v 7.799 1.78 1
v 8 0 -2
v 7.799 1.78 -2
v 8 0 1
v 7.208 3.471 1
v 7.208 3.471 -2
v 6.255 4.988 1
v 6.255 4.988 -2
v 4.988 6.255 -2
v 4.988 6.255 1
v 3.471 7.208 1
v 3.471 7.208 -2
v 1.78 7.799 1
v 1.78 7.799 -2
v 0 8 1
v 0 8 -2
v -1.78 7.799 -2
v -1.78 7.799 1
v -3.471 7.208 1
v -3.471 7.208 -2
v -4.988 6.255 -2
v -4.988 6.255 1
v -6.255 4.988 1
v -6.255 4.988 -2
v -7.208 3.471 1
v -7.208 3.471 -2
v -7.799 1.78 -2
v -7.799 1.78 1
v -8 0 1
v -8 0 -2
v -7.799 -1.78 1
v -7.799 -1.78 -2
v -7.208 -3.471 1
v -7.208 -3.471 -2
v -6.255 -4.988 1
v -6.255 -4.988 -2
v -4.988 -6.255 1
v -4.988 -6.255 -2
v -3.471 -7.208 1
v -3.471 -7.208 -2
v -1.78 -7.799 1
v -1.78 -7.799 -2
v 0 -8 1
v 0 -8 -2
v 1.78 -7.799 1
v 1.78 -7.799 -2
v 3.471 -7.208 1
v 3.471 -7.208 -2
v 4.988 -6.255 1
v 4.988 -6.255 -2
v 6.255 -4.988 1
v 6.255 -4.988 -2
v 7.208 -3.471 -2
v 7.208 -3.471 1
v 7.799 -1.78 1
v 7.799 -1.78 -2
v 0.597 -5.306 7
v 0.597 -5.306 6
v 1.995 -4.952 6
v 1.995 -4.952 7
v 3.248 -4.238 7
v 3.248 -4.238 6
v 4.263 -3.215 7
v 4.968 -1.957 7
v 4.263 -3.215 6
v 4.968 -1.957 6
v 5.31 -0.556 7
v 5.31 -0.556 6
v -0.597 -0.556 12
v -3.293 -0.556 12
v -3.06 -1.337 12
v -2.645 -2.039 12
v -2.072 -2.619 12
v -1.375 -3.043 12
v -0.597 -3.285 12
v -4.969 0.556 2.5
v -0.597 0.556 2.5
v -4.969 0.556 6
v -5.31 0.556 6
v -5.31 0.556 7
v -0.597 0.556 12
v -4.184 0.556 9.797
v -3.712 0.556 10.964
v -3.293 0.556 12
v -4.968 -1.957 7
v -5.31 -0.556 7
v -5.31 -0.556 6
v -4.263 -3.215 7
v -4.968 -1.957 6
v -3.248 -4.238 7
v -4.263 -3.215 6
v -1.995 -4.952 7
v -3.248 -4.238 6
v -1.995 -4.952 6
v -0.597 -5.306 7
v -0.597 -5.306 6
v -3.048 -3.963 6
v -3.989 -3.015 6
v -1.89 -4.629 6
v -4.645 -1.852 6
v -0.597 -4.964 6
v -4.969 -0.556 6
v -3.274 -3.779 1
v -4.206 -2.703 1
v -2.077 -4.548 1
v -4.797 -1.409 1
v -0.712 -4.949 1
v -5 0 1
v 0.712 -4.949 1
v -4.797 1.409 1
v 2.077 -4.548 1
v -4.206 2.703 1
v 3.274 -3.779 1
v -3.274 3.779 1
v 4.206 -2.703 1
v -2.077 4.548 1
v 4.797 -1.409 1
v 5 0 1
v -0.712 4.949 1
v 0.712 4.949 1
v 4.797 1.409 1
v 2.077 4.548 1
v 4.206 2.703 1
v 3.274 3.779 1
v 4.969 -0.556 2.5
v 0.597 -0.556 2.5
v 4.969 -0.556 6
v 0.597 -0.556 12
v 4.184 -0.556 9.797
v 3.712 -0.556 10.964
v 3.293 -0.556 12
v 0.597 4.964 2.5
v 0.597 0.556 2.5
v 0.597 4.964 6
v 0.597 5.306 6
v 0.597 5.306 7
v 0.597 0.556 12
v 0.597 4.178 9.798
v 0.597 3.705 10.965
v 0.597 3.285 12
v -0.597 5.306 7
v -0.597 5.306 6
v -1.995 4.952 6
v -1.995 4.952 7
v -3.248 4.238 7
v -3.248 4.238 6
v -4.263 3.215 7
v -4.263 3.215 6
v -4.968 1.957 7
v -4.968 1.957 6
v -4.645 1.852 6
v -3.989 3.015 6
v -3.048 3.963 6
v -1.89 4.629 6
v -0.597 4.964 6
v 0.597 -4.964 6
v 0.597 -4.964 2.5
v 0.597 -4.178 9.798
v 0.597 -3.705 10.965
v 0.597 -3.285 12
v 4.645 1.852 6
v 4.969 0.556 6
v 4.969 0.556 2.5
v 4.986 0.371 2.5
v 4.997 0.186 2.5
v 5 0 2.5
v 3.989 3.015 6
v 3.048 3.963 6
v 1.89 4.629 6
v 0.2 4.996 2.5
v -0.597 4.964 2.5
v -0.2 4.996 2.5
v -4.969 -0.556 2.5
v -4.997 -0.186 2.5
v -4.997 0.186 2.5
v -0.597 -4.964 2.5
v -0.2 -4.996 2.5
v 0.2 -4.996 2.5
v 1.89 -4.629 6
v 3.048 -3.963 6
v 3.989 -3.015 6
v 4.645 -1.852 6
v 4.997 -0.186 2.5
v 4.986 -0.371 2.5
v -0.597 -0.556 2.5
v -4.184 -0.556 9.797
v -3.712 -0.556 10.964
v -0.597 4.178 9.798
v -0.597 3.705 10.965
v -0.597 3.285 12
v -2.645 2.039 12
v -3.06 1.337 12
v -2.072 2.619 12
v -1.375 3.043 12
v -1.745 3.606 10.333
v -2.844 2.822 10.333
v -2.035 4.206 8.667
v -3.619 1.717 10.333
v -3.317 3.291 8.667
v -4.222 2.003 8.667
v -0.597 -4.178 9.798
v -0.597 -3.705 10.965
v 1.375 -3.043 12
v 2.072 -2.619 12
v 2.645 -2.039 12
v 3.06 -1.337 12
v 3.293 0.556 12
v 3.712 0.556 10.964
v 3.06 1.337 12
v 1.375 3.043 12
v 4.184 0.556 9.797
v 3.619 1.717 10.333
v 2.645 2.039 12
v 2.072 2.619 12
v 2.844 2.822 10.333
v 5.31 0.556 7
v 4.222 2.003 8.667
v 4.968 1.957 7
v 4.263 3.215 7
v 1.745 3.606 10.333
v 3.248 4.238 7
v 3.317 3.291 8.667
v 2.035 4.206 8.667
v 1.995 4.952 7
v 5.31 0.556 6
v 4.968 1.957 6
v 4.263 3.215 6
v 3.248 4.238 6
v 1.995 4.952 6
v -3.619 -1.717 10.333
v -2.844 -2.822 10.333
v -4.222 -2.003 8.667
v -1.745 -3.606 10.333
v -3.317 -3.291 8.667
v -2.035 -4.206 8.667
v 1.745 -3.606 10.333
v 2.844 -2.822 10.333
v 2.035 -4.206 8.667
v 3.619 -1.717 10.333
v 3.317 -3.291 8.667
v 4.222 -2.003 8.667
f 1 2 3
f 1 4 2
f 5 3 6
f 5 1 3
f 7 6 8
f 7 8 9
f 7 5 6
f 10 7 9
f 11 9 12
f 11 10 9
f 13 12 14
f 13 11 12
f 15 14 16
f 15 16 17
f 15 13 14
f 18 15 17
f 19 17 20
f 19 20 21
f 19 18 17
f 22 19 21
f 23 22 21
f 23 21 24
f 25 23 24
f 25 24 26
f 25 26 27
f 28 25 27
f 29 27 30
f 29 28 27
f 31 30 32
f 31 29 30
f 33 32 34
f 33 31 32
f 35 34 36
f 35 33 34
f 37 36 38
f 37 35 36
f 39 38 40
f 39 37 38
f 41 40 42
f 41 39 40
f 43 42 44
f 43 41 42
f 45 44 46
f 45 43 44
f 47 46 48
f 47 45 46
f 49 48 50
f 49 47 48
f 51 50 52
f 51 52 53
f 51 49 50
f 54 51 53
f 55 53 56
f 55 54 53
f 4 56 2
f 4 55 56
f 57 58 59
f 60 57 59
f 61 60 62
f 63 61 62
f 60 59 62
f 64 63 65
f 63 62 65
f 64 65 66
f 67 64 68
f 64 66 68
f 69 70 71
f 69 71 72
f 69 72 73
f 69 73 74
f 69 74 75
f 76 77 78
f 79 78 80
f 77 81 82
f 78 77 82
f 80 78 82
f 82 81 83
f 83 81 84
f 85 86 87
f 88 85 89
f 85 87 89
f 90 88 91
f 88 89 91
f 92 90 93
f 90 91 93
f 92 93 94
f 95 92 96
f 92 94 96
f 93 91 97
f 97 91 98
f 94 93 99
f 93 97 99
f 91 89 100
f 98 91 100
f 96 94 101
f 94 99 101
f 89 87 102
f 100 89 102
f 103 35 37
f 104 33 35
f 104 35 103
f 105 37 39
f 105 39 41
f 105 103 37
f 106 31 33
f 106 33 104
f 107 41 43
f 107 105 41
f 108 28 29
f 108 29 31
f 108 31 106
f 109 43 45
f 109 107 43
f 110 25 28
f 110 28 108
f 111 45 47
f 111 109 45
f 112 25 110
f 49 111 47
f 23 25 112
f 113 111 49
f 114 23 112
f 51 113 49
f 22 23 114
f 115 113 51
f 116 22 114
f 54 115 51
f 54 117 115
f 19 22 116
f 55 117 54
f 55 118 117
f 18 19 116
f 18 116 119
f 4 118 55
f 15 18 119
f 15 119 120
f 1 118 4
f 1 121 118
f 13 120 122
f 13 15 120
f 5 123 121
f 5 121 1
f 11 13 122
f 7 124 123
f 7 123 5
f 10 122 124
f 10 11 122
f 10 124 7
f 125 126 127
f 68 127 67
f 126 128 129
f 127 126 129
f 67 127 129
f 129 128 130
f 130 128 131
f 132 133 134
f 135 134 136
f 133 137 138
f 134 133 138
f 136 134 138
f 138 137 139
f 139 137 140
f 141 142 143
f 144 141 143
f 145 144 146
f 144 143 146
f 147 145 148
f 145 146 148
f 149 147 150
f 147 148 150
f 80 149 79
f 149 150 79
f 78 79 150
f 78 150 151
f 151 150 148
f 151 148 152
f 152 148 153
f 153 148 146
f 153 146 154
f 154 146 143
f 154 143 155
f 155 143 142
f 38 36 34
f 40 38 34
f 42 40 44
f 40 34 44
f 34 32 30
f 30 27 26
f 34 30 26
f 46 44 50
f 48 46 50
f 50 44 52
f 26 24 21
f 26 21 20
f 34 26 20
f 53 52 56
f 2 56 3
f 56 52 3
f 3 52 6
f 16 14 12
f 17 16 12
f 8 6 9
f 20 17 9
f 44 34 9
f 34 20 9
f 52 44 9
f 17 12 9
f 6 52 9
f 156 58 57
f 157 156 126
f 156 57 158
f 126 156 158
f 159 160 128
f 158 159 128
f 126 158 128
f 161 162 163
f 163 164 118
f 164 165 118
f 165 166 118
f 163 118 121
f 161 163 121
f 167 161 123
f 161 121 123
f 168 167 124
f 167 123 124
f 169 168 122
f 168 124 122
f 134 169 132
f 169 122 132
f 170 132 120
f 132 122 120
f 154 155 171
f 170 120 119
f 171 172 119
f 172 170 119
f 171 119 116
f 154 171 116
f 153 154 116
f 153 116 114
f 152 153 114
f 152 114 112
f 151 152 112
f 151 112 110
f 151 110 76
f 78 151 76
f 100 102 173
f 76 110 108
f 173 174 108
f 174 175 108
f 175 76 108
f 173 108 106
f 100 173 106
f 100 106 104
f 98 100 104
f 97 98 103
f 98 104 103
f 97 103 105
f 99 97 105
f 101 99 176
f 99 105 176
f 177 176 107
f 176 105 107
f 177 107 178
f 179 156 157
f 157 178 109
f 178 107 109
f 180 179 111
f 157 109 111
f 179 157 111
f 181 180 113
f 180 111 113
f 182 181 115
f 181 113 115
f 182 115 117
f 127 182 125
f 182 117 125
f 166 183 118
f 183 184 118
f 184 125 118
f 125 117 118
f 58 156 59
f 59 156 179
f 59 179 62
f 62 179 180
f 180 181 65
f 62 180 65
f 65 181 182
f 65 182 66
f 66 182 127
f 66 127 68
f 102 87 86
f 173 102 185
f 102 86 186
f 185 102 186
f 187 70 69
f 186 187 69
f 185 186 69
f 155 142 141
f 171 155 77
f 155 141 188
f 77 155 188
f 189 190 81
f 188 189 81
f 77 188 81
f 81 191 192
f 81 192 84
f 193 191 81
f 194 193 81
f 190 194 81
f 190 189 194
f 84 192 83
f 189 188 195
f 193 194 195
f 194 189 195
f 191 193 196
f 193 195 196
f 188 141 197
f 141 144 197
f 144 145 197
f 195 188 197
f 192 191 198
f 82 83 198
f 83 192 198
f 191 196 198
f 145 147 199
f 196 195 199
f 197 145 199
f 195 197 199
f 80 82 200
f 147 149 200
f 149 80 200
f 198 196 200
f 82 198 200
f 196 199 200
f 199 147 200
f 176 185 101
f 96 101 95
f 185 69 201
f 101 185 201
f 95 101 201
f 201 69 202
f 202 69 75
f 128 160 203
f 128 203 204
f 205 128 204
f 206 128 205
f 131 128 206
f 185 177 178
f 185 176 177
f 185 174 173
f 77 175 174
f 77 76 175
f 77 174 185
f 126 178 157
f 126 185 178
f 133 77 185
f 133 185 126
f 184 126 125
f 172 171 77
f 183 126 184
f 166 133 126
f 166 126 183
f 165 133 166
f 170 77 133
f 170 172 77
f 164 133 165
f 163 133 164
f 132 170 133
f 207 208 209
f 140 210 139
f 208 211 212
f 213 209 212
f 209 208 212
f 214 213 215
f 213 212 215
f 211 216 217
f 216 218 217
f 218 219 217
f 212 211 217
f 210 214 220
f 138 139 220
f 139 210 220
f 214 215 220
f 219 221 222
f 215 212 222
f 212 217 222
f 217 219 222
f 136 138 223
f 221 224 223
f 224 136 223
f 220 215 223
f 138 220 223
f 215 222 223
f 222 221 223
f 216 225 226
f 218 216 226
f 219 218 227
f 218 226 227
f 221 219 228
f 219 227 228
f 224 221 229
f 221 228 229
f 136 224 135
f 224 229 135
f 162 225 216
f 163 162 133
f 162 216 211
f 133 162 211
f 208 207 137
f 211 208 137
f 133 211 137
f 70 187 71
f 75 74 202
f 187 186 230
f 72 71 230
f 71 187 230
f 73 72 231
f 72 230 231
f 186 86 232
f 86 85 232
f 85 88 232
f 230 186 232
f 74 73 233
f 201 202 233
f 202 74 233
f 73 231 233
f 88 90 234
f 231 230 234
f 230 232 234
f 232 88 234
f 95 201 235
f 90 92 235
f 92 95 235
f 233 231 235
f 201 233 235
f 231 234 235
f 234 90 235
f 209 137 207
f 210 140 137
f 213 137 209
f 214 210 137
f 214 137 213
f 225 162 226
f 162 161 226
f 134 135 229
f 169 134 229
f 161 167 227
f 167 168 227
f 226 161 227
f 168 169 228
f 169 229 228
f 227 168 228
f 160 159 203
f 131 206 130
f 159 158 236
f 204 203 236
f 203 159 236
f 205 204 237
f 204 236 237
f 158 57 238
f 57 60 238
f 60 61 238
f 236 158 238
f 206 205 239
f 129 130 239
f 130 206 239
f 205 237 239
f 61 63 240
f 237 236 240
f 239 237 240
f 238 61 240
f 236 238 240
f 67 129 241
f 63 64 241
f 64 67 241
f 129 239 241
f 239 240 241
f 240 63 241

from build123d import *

# Parameters (mm, degrees)
F0_R      = 5
F1_DEPTH  = 12
F0_R_2    = 5.3391988331
F2_DEPTH  = 12
F3_DEPTH  = 6
F4_DEPTH  = 1
F0_R_3    = 8
F0_R_4    = 6
F5_DEPTH  = 1
F8_DEPTH  = 10
F9_SIZE2  = 5
F9_SIZE   = 2
F10_DEPTH = 2


with BuildPart() as f1:
    # F0 (on Top) → F1 (new body)
    with BuildSketch(Plane.XY):
        Circle(F0_R)
    extrude(amount=F1_DEPTH)

    # F0 (on Top) → F2 (join)
    with BuildSketch(Plane.XY):
        Circle(F0_R_2)
        Circle(F0_R, mode=Mode.SUBTRACT)
    extrude(amount=F2_DEPTH)

    # F0 (on Top) → F3 (cut)
    with BuildSketch(Plane.XY):
        Circle(F0_R_2)
        Circle(F0_R, mode=Mode.SUBTRACT)
    extrude(amount=F3_DEPTH, mode=Mode.SUBTRACT)

    # F0 (on Top) → F4 (join)
    with BuildSketch(Plane.XY):
        Circle(F0_R_2)
        Circle(F0_R, mode=Mode.SUBTRACT)
    extrude(amount=F4_DEPTH)



with BuildPart() as f4:
    # F0 (on Top) → F4, piece 2 (new body)
    with BuildSketch(Plane.XY):
        Circle(F0_R_3)
        Circle(F0_R_4, mode=Mode.SUBTRACT)
    extrude(amount=F4_DEPTH)


with BuildPart() as f1_1:
    add(f1.part)

    add(f4.part)  # F5 merges F4
    # F0 (on Top) → F5 (join)
    with BuildSketch(Plane.XY):
        Circle(F0_R_4)
        Circle(F0_R_2, mode=Mode.SUBTRACT)
    extrude(amount=F5_DEPTH)

    # F7 (on offset) → F8 (cut)
    with BuildSketch(Plane.XY.offset(12.5)):
        Polygon((-0.5972407078, -6.0852188617), (0.5972407078, -6.0852188617), (0.5972407078, -0.5560389838), (5.559894722, -0.5560389838), (5.559894722, 0.5560389838), (0.5972407078, 0.5560389838), (0.5972407078, 6.0852188617), (-0.5972407078, 6.0852188617), (-0.5972407078, 0.5560389838), (-5.559894722, 0.5560389838), (-5.559894722, -0.5560389838), (-0.5972407078, -0.5560389838), align=None)
    extrude(amount=-F8_DEPTH, mode=Mode.SUBTRACT)

    # F9
    f9_edges = [f1_1.edges().sort_by_distance(p)[0] for p in [
        (3.790008, -3.760703, 12),
        (-3.790008, -3.760703, 12),
        (3.790008, 3.760703, 12),
        (-3.790008, 3.760703, 12),
    ]]
    chamfer(f9_edges, length=F9_SIZE, length2=F9_SIZE2)

    # F0 (on Top) → F10 (join)
    with BuildSketch(Plane.XY):
        Circle(F0_R_3)
        Circle(F0_R_4, mode=Mode.SUBTRACT)
        Circle(F0_R_4)
        Circle(F0_R_2, mode=Mode.SUBTRACT)
        Circle(F0_R_2)
        Circle(F0_R, mode=Mode.SUBTRACT)
        Circle(F0_R)
    extrude(amount=-F10_DEPTH)


solid = f1_1.part
